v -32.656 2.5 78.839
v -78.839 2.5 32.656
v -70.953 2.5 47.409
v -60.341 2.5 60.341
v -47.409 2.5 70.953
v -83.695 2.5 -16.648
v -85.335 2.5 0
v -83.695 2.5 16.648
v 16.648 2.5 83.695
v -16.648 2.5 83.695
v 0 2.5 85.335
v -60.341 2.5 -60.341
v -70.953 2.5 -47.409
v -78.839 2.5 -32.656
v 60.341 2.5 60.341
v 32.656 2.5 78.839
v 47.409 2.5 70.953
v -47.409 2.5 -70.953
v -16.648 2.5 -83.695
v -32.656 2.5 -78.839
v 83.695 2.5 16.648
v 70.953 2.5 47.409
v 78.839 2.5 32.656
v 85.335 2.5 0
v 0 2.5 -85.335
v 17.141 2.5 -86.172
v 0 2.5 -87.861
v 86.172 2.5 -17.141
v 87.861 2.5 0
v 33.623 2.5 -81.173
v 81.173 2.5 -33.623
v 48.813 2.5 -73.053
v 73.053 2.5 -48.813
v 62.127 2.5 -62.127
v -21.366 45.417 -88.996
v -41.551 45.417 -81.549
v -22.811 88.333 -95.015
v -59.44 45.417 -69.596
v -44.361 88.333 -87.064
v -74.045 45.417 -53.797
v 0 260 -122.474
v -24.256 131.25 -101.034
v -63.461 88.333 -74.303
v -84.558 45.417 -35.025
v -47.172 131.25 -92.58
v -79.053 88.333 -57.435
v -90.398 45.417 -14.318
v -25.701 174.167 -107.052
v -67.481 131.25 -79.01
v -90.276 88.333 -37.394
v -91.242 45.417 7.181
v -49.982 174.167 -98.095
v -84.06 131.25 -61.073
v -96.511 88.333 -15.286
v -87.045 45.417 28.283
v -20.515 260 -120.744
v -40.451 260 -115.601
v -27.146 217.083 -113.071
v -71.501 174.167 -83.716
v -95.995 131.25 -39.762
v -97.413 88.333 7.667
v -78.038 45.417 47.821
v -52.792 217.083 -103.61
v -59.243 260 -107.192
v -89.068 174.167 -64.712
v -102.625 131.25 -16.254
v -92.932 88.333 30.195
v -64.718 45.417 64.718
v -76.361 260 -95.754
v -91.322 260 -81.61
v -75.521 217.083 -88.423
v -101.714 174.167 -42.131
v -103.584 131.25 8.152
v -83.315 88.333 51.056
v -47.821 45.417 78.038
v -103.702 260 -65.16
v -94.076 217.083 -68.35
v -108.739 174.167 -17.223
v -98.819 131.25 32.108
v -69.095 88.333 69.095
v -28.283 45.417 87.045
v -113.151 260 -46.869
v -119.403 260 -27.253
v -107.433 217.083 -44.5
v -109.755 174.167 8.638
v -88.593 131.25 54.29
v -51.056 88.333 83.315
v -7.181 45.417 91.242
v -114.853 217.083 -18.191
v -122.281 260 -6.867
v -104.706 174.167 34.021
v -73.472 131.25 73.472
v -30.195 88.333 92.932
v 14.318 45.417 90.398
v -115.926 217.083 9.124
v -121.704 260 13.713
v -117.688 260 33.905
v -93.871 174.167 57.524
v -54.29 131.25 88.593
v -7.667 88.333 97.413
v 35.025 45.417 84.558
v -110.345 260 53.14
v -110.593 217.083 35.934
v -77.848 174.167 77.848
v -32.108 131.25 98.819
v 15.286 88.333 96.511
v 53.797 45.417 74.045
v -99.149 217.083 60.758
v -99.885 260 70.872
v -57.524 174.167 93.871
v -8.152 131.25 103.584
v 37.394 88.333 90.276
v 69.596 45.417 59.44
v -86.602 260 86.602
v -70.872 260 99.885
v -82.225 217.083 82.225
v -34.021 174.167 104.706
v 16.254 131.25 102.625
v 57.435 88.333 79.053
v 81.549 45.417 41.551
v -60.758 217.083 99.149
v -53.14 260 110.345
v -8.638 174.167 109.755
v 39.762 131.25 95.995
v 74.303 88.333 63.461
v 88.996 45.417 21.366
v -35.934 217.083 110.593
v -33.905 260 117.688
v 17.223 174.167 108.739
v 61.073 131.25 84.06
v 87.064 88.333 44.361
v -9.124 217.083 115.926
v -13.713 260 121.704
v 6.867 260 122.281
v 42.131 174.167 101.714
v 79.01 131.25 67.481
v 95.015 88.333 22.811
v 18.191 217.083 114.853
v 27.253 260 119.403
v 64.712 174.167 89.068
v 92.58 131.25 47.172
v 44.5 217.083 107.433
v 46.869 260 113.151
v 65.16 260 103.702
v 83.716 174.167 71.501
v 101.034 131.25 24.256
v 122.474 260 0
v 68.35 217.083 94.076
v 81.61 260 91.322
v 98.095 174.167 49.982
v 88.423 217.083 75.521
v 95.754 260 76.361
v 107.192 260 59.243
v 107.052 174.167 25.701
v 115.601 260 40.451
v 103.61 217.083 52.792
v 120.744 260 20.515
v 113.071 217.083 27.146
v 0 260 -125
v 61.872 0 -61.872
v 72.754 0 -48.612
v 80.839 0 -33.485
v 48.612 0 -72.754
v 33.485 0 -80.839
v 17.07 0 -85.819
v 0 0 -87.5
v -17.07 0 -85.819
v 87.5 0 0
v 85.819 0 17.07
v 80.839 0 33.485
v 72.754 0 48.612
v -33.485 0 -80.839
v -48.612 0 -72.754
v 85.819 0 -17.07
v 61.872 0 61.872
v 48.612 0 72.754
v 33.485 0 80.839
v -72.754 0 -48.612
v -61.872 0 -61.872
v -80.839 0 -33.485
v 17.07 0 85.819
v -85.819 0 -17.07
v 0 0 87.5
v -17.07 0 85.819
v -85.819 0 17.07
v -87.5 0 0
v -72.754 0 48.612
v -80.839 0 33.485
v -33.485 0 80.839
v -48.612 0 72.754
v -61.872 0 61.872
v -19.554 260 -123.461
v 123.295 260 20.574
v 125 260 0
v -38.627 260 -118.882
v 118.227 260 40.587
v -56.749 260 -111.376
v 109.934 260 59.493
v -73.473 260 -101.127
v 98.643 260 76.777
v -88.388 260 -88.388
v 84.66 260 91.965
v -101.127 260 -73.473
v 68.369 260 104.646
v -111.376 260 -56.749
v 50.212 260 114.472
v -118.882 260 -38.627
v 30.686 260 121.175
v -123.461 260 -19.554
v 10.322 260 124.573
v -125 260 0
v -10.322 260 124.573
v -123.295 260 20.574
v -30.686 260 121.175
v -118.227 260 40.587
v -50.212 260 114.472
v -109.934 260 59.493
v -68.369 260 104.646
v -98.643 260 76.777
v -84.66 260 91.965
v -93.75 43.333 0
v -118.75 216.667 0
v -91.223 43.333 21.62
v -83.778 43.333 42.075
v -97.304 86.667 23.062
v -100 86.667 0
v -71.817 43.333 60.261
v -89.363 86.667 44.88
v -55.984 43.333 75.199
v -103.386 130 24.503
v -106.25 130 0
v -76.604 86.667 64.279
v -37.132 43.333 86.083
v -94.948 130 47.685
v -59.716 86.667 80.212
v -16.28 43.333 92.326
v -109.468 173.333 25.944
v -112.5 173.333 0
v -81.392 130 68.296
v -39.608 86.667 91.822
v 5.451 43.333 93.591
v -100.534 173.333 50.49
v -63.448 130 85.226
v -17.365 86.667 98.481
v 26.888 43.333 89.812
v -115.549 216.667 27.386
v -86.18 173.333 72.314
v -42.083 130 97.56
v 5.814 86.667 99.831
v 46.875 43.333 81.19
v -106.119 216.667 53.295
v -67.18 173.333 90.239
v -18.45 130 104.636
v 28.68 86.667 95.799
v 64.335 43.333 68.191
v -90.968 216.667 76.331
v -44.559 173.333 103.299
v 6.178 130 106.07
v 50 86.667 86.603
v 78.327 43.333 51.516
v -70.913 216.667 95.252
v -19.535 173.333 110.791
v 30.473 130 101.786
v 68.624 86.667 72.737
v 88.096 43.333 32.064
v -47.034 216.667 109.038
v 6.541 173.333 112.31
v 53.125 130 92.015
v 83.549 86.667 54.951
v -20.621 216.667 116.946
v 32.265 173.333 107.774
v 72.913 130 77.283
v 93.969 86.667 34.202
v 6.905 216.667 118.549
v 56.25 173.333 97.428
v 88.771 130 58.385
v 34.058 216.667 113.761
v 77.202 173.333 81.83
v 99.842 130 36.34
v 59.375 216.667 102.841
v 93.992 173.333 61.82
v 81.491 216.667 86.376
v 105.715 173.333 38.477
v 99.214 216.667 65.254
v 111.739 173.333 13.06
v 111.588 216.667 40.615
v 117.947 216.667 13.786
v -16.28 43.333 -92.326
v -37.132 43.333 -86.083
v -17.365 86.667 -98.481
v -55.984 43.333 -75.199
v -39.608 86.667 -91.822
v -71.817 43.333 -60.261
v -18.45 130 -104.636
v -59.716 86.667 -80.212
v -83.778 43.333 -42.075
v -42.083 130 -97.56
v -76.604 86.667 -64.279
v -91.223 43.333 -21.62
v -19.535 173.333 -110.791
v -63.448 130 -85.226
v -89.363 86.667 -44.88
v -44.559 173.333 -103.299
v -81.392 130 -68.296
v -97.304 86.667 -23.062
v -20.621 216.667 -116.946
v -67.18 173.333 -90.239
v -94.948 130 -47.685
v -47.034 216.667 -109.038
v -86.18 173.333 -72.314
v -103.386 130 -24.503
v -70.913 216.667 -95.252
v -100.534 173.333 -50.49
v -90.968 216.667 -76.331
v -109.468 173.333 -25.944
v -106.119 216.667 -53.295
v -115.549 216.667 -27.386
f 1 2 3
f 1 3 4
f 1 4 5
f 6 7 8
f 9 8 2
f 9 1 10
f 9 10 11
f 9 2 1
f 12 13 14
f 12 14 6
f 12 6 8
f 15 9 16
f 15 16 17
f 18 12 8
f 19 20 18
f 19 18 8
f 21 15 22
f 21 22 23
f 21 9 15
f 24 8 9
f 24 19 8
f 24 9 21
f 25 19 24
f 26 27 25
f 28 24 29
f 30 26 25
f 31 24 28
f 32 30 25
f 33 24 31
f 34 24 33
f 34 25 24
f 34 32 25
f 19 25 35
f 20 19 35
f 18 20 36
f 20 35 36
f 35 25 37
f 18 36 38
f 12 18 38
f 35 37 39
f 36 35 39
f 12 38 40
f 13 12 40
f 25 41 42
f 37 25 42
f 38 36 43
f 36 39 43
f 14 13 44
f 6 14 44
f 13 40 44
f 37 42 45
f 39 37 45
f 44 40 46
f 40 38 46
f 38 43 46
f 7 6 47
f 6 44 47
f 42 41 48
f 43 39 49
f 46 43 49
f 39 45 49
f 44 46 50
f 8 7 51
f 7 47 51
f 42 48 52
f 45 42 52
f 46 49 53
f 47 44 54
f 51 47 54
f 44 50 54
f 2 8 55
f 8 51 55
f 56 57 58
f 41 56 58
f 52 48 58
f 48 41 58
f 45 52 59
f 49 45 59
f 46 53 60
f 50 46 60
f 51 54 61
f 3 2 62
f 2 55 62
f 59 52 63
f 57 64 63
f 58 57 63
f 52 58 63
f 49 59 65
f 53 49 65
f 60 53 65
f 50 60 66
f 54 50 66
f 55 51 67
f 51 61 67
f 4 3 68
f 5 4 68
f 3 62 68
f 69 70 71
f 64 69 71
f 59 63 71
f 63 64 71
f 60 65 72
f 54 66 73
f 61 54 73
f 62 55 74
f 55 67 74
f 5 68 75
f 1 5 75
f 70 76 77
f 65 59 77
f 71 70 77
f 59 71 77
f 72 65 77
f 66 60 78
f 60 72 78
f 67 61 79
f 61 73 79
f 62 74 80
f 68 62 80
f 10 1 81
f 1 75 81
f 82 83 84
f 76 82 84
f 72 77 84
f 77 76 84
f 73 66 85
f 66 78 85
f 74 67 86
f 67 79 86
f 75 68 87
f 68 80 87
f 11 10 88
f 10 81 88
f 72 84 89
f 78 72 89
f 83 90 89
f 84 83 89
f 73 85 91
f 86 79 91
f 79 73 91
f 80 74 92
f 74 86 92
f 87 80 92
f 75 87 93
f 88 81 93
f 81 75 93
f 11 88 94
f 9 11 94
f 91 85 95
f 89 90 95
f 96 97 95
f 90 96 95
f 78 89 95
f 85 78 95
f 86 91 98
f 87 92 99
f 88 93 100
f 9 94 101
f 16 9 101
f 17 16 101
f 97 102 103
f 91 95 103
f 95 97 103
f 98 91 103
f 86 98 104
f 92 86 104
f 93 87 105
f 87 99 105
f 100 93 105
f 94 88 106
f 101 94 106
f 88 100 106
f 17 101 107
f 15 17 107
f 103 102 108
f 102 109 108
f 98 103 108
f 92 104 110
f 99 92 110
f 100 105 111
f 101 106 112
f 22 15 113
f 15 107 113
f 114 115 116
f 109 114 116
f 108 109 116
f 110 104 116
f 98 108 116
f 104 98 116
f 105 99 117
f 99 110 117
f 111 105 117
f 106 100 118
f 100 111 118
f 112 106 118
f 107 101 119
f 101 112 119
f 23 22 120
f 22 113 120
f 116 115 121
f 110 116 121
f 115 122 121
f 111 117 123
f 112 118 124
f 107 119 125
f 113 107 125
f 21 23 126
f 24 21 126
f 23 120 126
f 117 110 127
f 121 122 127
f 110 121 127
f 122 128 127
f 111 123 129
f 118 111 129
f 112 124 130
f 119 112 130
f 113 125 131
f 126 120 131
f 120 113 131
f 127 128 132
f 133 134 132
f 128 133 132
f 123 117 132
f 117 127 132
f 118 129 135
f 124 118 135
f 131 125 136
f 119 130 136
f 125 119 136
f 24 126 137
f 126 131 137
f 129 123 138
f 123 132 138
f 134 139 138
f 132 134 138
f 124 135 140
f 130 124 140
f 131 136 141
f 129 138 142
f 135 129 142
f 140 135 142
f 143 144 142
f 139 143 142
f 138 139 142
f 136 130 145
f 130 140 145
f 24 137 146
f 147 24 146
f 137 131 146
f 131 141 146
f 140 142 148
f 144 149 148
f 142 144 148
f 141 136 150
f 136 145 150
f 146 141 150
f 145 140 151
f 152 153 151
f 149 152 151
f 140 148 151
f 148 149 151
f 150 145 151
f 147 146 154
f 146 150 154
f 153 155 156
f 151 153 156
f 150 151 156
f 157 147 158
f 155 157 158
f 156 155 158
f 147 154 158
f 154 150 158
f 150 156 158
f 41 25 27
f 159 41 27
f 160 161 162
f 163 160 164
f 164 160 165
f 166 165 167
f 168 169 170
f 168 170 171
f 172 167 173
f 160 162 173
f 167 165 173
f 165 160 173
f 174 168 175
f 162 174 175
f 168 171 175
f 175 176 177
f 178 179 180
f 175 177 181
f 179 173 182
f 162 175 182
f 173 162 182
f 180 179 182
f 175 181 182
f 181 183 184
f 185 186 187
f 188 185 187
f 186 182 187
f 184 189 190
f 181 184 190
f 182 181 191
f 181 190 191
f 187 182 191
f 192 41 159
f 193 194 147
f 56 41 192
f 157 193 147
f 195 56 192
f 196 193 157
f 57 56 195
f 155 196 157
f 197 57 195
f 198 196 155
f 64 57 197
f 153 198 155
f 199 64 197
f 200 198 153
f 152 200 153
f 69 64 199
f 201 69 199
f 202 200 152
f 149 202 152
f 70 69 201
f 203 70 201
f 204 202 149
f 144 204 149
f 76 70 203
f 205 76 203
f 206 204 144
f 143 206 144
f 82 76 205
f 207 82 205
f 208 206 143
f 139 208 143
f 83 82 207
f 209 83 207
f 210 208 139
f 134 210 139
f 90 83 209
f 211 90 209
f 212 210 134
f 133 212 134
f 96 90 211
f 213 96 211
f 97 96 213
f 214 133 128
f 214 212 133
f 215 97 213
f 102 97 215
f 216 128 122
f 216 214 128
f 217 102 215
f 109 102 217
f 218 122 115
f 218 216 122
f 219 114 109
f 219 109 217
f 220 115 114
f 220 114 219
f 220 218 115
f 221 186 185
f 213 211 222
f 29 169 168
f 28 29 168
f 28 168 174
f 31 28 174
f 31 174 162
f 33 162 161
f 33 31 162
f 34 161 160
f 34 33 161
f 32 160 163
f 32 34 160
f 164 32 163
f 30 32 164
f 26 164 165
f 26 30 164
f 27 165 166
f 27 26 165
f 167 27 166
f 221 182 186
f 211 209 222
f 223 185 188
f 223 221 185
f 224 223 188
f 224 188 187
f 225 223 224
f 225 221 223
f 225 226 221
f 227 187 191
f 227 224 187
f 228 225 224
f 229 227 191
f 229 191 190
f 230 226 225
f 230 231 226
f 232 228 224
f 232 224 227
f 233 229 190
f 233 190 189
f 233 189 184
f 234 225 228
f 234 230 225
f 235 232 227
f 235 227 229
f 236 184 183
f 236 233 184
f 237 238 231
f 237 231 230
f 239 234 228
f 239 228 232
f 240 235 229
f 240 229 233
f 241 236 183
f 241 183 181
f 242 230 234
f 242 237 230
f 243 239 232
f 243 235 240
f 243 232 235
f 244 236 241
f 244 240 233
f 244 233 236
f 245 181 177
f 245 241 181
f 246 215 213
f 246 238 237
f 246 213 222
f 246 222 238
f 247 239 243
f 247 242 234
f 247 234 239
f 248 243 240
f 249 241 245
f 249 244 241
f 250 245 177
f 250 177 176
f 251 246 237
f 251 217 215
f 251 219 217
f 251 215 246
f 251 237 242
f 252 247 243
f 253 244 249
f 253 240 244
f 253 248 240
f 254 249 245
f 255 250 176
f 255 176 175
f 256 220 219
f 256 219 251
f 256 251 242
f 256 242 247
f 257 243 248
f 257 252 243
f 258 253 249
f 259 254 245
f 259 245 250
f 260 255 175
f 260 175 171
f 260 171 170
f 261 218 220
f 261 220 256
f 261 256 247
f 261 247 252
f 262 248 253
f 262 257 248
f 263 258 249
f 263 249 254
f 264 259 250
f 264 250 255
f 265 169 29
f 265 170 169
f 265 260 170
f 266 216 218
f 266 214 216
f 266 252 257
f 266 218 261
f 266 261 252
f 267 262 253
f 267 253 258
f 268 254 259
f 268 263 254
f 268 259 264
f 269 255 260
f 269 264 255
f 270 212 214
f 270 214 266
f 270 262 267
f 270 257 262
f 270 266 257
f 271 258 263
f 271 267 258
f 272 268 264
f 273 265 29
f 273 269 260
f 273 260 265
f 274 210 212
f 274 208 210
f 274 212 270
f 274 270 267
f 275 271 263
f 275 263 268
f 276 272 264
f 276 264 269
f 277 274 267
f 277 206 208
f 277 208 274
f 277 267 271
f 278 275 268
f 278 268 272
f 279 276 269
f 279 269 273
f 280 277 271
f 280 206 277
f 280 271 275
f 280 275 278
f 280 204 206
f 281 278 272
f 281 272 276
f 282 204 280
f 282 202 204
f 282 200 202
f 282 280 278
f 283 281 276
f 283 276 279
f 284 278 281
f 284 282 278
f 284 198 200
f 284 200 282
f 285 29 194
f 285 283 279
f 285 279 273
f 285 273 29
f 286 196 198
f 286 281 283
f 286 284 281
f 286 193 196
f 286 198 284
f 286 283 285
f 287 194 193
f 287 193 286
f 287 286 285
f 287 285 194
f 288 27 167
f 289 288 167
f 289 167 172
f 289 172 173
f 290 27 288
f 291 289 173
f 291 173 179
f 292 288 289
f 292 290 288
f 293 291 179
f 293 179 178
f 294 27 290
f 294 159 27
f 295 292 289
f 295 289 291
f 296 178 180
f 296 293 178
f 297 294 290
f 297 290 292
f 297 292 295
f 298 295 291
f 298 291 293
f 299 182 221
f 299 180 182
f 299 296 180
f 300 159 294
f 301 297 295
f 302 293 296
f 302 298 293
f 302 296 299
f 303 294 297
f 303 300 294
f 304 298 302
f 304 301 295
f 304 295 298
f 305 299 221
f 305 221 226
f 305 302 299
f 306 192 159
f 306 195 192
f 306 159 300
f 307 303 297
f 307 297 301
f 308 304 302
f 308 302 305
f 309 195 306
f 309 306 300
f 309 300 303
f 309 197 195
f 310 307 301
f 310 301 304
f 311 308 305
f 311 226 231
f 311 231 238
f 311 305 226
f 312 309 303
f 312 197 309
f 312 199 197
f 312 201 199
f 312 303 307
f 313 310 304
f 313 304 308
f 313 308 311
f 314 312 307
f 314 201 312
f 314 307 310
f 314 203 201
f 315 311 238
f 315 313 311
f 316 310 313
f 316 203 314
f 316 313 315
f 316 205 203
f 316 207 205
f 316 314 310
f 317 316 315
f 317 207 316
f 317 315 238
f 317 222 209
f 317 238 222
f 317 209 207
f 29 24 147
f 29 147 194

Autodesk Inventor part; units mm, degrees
ref_plane "YZ Plane" through (0, 0, 0) normal (1, 0, 0) x (0, 1, 0)
ref_plane "XY Plane" through (0, 0, 0) normal (0, 0, 1) x (1, 0, 0)
sketch "Sketch1" plane through (0, 0, 0) normal (0, 1, 0) x (-1, 0, 0)
  circle A0 centre (0, 0) radius 87.5
  dimension "d0" = 175
ref_plane "Work Plane1" through (0, 260, 0) normal (0, 1, 0) x (-1, 0, 0)
sketch "Sketch2" plane through (0, 260, 0) normal (0, 1, 0) x (-1, 0, 0)
  circle A0 centre (0, 0) radius 125
  dimension "d2" = 250
loft "Loft1" add profiles "Sketch1", "Sketch2"
shell "Shell1" thickness 2.5 removed faces 1 at (0.6944, 260, 22.8612)
sketch "Sketch3" plane through (0, 260, 0) normal (0, 1, 0) x (1, 0, 0)
  line L0 (0, 0) -> (156, 0)
  line L1 (0, 0) -> (0, 209)
  line L2 (0, 209) -> (156, 209)
  line L3 (156, 209) -> (156, 0)
extrude "Extrusion1" cut sketch "Sketch3" against normal up to surface (257.5 mm away)
properties part number "Topf" material "Concrete"
